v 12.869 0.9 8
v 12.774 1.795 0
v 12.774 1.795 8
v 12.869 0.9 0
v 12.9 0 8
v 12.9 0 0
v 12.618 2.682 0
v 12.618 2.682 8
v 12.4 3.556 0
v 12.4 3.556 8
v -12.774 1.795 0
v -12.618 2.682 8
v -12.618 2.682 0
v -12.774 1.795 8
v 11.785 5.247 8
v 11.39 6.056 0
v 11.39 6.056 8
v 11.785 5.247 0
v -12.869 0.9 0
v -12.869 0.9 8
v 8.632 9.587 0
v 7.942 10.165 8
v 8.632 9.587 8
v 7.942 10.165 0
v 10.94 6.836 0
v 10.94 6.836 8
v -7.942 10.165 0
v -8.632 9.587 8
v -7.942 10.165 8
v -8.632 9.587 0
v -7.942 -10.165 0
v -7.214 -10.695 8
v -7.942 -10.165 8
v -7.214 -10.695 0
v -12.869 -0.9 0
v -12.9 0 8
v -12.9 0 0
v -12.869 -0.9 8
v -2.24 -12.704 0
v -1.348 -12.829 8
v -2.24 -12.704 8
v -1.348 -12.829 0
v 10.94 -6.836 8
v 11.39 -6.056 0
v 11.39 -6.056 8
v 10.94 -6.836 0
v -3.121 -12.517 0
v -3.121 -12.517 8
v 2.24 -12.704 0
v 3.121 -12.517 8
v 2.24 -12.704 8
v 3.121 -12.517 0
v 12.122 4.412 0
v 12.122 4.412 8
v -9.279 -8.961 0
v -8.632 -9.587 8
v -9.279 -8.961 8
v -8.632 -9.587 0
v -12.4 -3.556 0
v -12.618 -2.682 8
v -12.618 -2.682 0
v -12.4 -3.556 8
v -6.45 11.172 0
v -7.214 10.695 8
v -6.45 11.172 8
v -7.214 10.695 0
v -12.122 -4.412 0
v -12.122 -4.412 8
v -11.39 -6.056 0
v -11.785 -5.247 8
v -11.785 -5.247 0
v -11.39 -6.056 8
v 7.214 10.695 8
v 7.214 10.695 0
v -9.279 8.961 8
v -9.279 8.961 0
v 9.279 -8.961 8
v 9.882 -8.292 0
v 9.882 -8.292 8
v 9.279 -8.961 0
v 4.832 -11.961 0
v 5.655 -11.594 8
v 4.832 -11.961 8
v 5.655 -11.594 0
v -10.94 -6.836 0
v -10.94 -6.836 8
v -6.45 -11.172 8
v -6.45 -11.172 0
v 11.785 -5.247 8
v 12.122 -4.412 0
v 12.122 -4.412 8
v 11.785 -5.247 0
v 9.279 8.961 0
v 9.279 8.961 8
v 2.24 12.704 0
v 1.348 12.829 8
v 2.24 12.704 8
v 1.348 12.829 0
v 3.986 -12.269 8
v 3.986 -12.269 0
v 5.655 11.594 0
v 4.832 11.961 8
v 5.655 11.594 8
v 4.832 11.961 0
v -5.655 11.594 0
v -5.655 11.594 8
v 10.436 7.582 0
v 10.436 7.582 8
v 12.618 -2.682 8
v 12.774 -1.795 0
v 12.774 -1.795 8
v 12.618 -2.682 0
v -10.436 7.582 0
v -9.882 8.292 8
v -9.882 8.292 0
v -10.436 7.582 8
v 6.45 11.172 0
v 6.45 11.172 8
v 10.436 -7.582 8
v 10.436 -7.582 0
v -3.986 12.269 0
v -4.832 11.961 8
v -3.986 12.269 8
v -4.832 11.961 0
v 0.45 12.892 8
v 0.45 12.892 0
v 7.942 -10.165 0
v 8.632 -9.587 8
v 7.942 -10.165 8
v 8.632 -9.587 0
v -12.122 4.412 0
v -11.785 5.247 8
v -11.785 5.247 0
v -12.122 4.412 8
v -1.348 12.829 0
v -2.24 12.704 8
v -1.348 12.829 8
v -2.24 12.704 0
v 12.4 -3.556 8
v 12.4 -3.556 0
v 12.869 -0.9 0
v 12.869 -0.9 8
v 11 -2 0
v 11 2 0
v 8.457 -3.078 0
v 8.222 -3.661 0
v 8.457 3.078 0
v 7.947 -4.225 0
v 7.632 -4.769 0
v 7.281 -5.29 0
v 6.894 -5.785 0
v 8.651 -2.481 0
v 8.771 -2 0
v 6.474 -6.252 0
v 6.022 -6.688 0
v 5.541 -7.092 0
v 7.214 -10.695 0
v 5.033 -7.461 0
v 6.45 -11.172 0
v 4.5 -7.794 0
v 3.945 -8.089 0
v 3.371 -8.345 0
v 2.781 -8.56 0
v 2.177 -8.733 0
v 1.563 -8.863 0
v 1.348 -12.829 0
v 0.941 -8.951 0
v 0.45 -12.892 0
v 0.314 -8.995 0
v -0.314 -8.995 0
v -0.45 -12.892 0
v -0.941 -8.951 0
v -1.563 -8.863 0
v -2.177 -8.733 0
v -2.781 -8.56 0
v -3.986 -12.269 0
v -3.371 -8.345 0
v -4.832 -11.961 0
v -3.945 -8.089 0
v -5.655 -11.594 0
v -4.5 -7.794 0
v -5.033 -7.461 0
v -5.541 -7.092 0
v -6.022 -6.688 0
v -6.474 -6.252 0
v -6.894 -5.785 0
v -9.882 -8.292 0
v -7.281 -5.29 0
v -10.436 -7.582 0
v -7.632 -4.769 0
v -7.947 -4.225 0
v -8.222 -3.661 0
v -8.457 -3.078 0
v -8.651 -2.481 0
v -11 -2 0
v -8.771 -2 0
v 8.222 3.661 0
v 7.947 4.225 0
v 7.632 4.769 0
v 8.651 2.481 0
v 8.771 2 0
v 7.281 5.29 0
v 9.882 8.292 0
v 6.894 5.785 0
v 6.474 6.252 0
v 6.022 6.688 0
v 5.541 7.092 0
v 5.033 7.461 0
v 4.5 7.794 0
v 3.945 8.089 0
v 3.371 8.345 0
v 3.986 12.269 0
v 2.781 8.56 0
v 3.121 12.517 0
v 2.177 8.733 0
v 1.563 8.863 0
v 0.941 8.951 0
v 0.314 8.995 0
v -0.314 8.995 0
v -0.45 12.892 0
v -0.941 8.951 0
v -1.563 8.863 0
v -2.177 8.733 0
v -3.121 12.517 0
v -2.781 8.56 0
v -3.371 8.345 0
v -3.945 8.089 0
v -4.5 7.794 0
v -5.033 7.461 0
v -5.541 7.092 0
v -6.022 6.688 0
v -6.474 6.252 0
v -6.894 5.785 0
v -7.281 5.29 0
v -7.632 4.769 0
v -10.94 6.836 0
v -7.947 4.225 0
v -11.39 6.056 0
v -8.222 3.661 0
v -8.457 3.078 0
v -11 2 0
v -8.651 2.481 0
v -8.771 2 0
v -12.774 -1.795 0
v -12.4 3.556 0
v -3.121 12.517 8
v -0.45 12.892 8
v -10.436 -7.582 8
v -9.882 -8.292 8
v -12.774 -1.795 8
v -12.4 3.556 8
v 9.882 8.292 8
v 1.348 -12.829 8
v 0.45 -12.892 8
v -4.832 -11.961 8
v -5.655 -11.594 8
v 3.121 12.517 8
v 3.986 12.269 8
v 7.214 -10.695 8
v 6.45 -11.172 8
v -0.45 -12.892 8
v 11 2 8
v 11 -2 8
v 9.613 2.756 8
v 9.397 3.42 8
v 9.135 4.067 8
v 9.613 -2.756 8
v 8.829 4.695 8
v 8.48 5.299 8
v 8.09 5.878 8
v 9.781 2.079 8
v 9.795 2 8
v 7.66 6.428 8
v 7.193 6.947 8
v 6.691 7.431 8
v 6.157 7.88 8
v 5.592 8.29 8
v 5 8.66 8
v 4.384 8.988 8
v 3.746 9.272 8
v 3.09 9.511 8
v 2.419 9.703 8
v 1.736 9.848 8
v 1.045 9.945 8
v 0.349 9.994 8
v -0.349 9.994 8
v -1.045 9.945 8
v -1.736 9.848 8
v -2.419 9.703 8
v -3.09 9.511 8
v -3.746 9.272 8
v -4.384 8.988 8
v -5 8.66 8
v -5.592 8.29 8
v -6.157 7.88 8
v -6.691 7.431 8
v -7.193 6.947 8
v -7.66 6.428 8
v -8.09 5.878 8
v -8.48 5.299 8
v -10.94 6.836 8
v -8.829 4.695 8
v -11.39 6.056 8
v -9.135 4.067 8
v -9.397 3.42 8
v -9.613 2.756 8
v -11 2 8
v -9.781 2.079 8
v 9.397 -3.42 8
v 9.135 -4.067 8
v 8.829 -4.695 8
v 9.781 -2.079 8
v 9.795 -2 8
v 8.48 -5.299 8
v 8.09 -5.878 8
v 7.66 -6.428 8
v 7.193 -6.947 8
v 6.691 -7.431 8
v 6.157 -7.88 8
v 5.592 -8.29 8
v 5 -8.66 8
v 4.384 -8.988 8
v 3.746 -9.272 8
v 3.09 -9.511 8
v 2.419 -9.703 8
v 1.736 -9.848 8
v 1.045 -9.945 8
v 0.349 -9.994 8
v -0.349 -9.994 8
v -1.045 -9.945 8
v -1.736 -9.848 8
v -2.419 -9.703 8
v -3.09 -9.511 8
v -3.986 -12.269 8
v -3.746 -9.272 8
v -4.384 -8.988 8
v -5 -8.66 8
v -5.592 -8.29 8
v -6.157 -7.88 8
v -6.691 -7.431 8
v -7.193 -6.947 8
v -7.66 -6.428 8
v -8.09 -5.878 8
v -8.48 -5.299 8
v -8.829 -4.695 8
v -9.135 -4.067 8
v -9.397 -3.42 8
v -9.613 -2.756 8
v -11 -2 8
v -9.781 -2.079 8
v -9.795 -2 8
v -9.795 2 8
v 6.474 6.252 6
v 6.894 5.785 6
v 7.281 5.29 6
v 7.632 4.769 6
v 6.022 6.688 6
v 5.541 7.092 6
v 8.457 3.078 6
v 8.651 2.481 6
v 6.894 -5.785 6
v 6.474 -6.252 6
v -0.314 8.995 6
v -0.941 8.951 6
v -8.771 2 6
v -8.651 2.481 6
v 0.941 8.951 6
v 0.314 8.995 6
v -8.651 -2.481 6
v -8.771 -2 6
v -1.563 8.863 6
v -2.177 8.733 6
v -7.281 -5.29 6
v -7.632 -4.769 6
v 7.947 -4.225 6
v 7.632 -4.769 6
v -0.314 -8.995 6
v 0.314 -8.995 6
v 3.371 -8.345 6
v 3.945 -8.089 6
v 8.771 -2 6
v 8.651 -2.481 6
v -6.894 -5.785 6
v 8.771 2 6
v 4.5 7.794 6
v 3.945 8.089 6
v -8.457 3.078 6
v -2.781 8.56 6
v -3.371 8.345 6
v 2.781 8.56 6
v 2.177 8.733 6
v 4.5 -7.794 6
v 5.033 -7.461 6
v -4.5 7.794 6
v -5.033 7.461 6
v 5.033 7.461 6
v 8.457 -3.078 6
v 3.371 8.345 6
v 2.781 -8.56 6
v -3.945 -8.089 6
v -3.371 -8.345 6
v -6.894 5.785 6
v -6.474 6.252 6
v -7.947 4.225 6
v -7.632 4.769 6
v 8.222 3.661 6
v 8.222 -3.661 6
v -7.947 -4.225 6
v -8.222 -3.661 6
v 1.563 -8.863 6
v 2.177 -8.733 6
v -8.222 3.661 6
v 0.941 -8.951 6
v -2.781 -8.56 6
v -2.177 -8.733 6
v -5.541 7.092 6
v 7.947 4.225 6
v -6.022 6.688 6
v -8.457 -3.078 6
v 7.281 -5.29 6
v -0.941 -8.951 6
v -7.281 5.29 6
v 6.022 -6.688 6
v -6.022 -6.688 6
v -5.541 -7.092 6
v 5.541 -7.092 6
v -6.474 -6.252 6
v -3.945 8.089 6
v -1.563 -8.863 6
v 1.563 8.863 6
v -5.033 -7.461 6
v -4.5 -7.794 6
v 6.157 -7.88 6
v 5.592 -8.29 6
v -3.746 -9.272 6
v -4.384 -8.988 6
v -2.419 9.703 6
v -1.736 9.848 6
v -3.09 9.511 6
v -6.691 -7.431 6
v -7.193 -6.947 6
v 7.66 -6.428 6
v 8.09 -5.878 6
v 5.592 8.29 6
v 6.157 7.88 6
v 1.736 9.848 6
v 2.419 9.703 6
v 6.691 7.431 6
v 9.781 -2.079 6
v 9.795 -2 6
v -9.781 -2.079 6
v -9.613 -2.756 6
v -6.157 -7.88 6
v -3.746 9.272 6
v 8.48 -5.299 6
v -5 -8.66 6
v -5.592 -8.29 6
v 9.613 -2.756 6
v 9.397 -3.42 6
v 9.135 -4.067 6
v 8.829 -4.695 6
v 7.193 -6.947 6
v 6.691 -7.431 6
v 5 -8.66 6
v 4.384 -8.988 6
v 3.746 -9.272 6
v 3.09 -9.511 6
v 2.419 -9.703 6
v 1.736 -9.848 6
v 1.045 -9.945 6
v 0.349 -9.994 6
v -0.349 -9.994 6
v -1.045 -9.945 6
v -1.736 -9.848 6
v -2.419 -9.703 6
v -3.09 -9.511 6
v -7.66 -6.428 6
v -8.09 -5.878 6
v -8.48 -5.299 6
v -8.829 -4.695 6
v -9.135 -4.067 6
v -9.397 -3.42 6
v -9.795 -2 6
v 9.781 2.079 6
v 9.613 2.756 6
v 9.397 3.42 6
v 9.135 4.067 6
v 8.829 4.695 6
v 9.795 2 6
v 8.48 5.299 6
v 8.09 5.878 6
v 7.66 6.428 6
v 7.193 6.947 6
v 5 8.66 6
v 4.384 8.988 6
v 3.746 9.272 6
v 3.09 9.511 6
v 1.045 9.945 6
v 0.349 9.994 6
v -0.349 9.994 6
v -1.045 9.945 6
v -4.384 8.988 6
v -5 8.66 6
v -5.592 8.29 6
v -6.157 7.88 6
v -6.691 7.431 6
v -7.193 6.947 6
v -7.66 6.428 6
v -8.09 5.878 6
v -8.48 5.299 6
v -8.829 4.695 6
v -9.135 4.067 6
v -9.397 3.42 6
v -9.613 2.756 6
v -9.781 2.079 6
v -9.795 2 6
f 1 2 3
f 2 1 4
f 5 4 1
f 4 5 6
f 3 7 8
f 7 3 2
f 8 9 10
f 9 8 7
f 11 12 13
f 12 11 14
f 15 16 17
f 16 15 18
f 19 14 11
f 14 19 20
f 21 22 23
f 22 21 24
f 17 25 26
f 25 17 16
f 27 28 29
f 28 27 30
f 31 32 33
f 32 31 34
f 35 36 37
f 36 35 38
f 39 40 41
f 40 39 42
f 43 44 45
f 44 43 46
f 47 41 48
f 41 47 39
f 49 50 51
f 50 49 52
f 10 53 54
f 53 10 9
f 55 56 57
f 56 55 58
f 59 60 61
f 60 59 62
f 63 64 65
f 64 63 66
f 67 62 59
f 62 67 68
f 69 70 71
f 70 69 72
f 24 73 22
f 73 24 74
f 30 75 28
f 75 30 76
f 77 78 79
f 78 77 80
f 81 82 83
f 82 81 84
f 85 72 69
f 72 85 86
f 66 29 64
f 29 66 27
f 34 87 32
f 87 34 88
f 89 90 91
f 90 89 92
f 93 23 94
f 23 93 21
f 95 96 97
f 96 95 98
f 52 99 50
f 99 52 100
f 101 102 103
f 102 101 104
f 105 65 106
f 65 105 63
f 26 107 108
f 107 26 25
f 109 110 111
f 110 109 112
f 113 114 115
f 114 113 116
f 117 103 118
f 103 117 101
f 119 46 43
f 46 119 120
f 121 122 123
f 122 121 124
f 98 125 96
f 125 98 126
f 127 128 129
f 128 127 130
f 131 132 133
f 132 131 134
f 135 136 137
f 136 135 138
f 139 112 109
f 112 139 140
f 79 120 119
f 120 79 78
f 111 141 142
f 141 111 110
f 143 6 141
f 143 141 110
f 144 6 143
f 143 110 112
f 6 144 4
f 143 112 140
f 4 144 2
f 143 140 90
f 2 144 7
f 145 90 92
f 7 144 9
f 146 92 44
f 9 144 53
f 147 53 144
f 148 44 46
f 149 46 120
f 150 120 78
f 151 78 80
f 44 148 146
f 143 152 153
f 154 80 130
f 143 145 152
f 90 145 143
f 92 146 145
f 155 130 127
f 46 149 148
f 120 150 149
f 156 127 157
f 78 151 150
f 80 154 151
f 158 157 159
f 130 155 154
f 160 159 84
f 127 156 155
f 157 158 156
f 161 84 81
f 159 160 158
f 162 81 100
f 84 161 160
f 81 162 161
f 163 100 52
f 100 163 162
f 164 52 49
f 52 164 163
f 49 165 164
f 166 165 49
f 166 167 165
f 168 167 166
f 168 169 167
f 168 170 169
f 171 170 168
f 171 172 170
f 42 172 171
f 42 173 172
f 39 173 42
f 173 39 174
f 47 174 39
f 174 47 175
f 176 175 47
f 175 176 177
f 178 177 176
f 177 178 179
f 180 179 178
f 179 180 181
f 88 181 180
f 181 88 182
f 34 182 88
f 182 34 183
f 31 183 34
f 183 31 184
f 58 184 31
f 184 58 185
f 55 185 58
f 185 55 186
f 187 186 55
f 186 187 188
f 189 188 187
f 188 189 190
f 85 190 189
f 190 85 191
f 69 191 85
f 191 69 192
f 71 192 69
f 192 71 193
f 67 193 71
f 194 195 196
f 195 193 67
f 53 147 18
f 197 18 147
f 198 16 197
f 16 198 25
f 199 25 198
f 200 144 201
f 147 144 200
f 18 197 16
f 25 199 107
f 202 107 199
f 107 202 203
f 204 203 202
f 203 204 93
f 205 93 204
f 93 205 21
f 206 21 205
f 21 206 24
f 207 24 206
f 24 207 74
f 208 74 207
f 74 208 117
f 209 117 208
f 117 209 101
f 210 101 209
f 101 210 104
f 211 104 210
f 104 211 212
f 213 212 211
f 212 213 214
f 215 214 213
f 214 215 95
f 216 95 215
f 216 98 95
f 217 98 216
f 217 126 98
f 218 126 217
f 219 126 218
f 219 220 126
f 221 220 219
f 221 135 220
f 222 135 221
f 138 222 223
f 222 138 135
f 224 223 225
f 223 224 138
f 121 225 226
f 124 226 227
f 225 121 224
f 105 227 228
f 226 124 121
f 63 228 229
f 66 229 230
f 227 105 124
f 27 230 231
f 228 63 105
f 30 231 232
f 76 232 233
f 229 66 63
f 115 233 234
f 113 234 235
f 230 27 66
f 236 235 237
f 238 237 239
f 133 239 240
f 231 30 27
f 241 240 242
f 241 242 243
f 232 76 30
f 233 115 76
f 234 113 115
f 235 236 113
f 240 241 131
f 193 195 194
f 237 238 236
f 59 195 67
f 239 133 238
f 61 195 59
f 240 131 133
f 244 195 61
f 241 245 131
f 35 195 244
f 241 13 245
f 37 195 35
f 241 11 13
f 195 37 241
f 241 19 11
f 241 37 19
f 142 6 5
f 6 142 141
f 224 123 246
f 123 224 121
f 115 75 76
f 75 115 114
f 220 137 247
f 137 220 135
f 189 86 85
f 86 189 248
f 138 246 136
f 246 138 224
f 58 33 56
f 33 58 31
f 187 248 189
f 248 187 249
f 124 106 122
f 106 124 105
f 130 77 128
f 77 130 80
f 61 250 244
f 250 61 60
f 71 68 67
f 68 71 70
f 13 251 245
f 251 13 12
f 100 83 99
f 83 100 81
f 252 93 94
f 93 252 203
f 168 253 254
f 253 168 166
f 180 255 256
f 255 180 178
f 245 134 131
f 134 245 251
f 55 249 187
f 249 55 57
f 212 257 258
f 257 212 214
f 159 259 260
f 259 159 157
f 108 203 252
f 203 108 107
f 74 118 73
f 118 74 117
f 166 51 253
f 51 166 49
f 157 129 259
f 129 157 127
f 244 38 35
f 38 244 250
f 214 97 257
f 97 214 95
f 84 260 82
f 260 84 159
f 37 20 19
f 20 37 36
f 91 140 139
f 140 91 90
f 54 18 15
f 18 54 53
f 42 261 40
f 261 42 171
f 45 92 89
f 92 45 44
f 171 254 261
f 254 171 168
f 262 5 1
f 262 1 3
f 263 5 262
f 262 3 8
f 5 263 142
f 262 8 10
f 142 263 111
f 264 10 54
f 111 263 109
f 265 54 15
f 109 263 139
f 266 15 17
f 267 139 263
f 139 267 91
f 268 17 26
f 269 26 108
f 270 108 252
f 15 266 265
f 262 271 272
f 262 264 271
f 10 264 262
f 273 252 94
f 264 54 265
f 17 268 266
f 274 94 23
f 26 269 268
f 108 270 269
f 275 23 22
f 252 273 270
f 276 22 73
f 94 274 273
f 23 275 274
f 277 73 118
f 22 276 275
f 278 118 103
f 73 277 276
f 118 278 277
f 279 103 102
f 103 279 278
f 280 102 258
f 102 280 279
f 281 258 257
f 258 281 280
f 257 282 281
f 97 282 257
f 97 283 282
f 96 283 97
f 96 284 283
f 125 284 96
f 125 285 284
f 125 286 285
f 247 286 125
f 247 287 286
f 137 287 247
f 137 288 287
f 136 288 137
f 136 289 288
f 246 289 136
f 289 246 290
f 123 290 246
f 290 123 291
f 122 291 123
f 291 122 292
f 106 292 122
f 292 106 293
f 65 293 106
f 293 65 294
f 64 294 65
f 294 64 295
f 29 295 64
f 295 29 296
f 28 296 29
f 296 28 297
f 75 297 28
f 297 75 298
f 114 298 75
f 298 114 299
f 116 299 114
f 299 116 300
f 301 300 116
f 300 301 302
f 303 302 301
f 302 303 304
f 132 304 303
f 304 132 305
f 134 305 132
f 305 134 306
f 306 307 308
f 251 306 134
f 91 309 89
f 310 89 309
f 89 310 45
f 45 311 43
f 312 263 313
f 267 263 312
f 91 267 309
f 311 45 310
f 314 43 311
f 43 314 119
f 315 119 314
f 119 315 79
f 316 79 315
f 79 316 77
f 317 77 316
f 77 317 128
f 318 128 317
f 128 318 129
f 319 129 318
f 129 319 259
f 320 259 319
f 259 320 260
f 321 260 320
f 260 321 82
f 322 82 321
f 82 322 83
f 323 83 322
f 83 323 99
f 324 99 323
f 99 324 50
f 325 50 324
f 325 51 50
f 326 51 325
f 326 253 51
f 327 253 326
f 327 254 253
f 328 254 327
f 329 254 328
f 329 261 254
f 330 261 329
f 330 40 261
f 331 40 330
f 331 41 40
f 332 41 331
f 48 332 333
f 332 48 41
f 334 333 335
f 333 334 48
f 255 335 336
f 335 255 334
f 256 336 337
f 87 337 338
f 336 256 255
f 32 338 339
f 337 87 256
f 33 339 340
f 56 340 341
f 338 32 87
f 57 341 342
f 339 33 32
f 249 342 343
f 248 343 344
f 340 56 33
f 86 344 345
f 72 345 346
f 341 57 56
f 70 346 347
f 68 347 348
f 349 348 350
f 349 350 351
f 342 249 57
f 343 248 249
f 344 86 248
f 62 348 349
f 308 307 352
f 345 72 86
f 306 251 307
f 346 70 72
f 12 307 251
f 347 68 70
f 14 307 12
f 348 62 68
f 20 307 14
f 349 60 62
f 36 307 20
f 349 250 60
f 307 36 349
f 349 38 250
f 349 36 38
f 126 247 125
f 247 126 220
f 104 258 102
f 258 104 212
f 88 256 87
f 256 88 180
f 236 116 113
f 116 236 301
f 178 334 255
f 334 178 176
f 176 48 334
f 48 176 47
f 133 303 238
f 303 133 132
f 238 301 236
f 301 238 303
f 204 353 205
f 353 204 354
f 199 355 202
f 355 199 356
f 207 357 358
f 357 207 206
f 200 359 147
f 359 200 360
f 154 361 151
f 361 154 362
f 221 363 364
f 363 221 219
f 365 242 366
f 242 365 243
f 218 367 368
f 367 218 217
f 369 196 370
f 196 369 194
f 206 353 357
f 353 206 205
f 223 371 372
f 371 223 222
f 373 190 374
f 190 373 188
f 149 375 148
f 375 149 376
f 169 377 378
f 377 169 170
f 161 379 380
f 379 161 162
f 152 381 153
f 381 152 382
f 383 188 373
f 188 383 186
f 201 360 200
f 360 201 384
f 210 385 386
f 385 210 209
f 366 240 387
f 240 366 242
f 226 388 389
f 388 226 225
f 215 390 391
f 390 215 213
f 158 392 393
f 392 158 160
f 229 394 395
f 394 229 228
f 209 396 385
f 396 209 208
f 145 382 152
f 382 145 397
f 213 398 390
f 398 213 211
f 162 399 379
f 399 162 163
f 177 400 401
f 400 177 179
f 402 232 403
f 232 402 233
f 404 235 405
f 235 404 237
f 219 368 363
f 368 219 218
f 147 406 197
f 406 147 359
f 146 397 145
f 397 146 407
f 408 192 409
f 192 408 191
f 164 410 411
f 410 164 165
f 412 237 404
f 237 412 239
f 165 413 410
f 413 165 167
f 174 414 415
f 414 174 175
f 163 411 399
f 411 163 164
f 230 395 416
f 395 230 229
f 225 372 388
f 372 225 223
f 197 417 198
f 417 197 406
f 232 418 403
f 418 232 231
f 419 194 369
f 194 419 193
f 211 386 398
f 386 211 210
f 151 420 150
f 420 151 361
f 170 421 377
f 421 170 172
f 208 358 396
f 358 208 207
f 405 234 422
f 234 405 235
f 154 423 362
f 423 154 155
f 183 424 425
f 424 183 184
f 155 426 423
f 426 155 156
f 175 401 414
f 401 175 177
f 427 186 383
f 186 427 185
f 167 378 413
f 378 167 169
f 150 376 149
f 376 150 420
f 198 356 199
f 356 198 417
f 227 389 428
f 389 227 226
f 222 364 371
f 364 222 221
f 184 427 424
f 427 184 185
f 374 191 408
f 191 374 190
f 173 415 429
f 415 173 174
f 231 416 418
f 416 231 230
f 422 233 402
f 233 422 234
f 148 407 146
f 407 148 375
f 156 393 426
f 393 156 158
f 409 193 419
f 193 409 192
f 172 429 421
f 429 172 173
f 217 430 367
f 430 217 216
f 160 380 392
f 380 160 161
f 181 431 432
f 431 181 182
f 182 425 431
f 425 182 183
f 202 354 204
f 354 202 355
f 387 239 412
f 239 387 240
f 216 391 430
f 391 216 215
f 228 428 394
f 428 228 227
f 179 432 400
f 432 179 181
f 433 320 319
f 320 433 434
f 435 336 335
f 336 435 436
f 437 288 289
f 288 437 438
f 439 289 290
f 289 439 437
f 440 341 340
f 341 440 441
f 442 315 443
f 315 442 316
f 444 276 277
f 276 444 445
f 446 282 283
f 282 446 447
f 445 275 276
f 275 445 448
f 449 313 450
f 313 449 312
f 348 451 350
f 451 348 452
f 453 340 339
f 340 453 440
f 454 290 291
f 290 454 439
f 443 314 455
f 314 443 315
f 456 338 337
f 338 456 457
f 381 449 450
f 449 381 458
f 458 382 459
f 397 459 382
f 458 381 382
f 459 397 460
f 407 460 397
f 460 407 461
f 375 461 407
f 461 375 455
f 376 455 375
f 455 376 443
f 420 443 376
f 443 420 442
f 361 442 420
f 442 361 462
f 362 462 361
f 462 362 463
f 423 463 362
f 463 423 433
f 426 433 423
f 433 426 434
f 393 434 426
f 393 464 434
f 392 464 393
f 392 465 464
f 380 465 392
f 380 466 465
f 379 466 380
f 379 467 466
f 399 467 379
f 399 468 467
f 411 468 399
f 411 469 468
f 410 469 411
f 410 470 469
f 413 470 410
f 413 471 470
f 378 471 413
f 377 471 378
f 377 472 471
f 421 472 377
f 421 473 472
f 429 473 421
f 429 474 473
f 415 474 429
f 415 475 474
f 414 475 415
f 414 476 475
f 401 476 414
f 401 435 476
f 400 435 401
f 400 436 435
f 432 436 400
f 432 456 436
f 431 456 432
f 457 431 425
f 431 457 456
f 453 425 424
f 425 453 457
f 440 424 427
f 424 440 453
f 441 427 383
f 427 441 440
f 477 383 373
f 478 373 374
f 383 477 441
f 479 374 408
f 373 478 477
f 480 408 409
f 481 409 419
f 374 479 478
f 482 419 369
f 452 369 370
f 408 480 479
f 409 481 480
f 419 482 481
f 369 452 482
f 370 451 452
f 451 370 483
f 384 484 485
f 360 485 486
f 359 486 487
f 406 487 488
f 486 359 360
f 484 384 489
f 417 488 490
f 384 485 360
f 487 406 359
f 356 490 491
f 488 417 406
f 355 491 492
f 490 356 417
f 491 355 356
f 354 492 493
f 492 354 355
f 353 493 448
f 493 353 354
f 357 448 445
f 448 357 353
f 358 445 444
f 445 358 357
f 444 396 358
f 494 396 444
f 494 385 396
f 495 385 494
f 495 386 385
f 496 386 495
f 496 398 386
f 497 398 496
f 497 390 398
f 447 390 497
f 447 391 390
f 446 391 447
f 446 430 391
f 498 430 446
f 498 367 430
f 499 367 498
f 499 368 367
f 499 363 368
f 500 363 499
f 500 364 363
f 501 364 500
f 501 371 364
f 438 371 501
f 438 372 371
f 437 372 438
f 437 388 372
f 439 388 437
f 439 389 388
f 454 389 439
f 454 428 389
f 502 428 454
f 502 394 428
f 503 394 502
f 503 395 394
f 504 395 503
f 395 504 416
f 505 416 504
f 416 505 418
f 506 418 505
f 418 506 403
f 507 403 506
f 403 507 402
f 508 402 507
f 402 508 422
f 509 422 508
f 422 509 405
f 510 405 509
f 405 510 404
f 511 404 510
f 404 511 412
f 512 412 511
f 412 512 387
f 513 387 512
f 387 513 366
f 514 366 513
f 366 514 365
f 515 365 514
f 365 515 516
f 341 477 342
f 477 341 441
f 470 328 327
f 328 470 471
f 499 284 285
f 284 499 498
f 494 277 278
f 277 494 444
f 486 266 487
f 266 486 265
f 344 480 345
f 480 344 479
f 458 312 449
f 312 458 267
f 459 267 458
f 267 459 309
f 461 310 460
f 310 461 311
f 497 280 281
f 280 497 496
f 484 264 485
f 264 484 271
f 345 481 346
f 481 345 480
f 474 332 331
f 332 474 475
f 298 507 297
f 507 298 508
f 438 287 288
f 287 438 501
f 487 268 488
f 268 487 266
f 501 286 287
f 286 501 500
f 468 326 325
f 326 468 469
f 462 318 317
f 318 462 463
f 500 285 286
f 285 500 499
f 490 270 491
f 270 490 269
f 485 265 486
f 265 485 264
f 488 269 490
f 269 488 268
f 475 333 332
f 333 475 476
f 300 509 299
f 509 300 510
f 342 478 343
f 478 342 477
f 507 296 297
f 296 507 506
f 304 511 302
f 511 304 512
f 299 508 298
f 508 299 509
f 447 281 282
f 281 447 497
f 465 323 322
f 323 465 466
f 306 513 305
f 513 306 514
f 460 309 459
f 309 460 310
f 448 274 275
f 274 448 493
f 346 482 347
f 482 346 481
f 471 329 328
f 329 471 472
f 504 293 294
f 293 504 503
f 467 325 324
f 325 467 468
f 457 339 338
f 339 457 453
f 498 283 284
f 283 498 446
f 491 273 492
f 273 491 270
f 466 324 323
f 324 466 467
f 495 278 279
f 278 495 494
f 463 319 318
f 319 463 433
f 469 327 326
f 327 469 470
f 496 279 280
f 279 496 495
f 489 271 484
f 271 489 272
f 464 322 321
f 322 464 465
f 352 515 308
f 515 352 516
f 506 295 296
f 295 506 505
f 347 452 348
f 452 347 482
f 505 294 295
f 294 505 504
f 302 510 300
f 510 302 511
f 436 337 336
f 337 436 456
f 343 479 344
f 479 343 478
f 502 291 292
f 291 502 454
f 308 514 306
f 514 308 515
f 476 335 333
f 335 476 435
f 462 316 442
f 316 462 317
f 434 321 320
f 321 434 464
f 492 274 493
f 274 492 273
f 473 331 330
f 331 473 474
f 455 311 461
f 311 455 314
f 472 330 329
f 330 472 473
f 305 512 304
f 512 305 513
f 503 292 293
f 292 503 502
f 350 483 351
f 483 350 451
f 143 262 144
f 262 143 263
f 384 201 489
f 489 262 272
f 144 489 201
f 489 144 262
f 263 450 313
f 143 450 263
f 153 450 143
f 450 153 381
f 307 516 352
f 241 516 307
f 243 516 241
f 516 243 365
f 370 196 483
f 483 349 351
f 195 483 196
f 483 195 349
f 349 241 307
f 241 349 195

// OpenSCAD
// file: dim.scad
FACES 				= 180;
EPSILON 			= 0.1;

INCHES_TO_MM 		= 25.4;
MM_TO_INCHES 		= 1 / INCHES_TO_MM;

// Marks - absolute location.
M_WAY_BACK          = -40;
M_POMMEL            = -37;      // approximate. hard to measure.
M_SPEAKER_BACK      = -36;
M_0                 = 0;        // physical back of the lightsaber main body.
M_AFT_STOP          = 10;
M_DISPLAY           = 14;       // was 15
M_PORT_CENTER       = 58;
M_CRYSTAL_VIEW_CENTER = 93;
M_SWITCH_CENTER     = 147.5;
M_EMITTER_BASE      = 165.5;
M_EMITTER           = M_EMITTER_BASE + 0;

M_MC                = 68;

H_FAR               = 240;

// inner diameter of the lightsaber tube.
// shock is constant, within tolerances
D_INNER      		= 32.258;
R_INNER             = D_INNER / 2;
D_INNER_CORE        = 25;
D_OUTER             = 37.6;
D_AFT               = 25.8;
R_AFT               = D_AFT / 2;
D_AFT_RING          = 33.5;
H_AFT_RING          = 6;
H_AFT_LIP           = 4;
FLOOR_Y             = -12;
Y_FLATTEN           = -15;

M_AFT_STOP_FRONT    = M_AFT_STOP + H_AFT_RING + H_AFT_LIP;

H_SPEAKER = 3.6 + 1.0;  // space for the physical speaker
X_SPEAKER = 20;
Y_SPEAKER = 14.2;   
Y_SPEAKER_INNER = 8.4;  // air channel
H_SPEAKER_HOLDER = H_SPEAKER + 1.2;

// emitter head
D_EMITTER_RING      = 33.4;

// dimensions of the main ring.
H_RING 				= 16;
T_RING 				= 2.5;

// dimensions of pin holders and pins
PIN	   				= 2.54;
H_PIN_HOLDER 		= 8;
T_PIN_HOLDER_WALL 	= 2;

N_TEETH				= 2;
TEETH_ANGLE			= 90;

// Pin counts:
X_EMITTER 			= 4;
Y_EMITTER 			= 1;

H_BUTTRESS			= 3.5;       // internal buttress / baffles
DZ_BUTTRESS         = 4.5;

M_ZONE_0            = M_DISPLAY;
M_ZONE_1            = M_AFT_STOP_FRONT + H_BUTTRESS*5 + DZ_BUTTRESS*6 - 0.001;
M_ZONE_2            = M_AFT_STOP_FRONT + H_BUTTRESS*14 + DZ_BUTTRESS*14 + 0.001;
M_ZONE_3            = M_EMITTER_BASE;

W_CRYSTAL           = 12.1;
H_CRYSTAL           = 10;
Y_CRYSTAL           = 9;        // offset up of the crystal
Z_CRYSTAL           = 52;

DISPLAY_W           = 23 + 0.5;
DISPLAY_L           = 32 + 0.5;
DISPLAY_MOUNT_W     = 17;
DISPLAY_MOUNT_L     = 26;
D_DISPLAY_MOUNT     = 2;
Y_DISPLAY           = 10;
DISPLAY_PINS        = 20;

D_SWITCH			= 12.5;						// actually 12, by thread.
Y_SWITCH            = 13.5;

D_PORT              = 7.9;

W_MC                = 18;
H_MC                = 11;
Z_MC_35             = 71.5;     // includes SD
SHOULDER_DX         = 2.5;
SHOULDER_DZ         = 3.5;

X_ROD               = 10.5;
Y_ROD               =  3.5;
D_ROD               =  3.4;

POWER_DX            = 9.6;
POWER_DY            = 14;
POWER_DZ            = 11;
POWER_Y             = 0.5;

H_BATTERY           = 68;
D_BATTERY           = 18.50 + 0.5;    // An 1850. Huh. 
DY_BATTERY          = -1;

X_DOTSTAR           = 5.0 + 0.5;  // from spec
Y_DOTSTAR           = 1.4;  // from spec
DOTSTAR_STRIP       = 12.4;

DX_USB              = 21.0;
DX_USB_INNER        = 14.0;
DY_USB              = 10.4;
SLOT_USB            = 1.0;

OFFSET_EMITTER = -PIN + sqrt(R_INNER * R_INNER - PIN * PIN * X_EMITTER * X_EMITTER / 4);

module emitterPin(h, longY)
{
	Y = longY ? 40 : PIN;

    translate([-X_EMITTER * PIN / 2, OFFSET_EMITTER, 0]) {
        cube([X_EMITTER * PIN, Y, h]);
    }	
}

module emitterHolder(h)
{
    translate([-X_EMITTER * PIN / 2, OFFSET_EMITTER, 0]) {
    	translate([-T_PIN_HOLDER_WALL, -T_PIN_HOLDER_WALL, 0]) {
      		cube([X_EMITTER * PIN + T_PIN_HOLDER_WALL*2, PIN + T_PIN_HOLDER_WALL*2, h]);
    	}
    }	
	
}

// Uses the same dimensions as the emitter holder so they 
// can be used interchangeably.
module lock(h)
{
    translate([-X_EMITTER * PIN / 2 - T_PIN_HOLDER_WALL, -20, 0]) {
		cube([X_EMITTER * PIN + T_PIN_HOLDER_WALL * 2, 40, h]);
	}	
}
// file: ../shapes.scad
FACES   = 180;
EPSILON = 0.1;
PIN	    = 2.54;


module tube(h=1, inner=0, outer=0, di=0, do=0) {
    rInner = inner > 0 ? inner : di / 2;
    rOuter = outer > 0 ? outer : do / 2;

	if (rInner >= rOuter) echo("ERROR in tube. rOuter must be > rInner.");

	difference() {
		cylinder(h=h, r=rOuter);
		translate([0,0,-EPSILON]) {
			cylinder(h=h + EPSILON*2, r=rInner);
		}
	}
}

module roundedRect(h, d)
{
	D0 = d * 0.8;
	D1 = d * 0.2;
	H = h;

	hull()
	{
		translate([-D0/2, -D0/2, 0]) {
			cube([D0, D0, H]);
		}
		translate([-D0/2, -D0/2, 0])  cylinder(d=D1, h=H);
		translate([ D0/2, -D0/2, 0])  cylinder(d=D1, h=H);
		translate([-D0/2,  D0/2, 0])  cylinder(d=D1, h=H);
		translate([ D0/2,  D0/2, 0])  cylinder(d=D1, h=H);
	}
}

module cubePair(x, size)
{
	translate([x, 0, 0])
		cube(size=size);
	mirror([1,0,0]) translate([x, 0, 0])
		cube(size=size);
}

module polygonXY(h, points)
{
    linear_extrude(height = h) {
        polygon(points=points);
    }  
}

module polygonYZ(h, points)
{
    multmatrix(m = [ [0, 0, 1, 0],
    				 [1, 0, 0, 0],
    				 [0, 1, 0, 0],
    				 [0, 0, 0, 1]
       			   ])
    linear_extrude(height = h) {
        polygon(points=points);
    }  	
}

module polygonXZ(h, points)
{
    multmatrix(m = [ [1, 0, 0, 0],
    				 [0, 0, 1, 0],
    				 [0, 1, 0, 0],
    				 [0, 0, 0, 1]
       			   ])
    linear_extrude(height = h) {
        polygon(points=points);
    }  	
}


module zCapsule(dz0, dz1, r)
{
    hull() {
        translate([0, 0, dz0]) rotate([-90, 0, 0]) cylinder(h=50, r=r);
        translate([0, 0, dz1]) rotate([-90, 0, 0]) cylinder(h=50, r=r);
    }
}


module xRoofCube(size)
{
	x = size[0];
	y = size[1];
	z = size[2];

	polygonXY(h=z, points=[
		[0, 0],
		[x, 0],
		[x, y + x],		// gets the 45 degree angle for printing
		[0, y]
	]);
}
// main file
use <../shapes.scad>
include <dim.scad>

/*
	2 sections:
	SPKR_METAL
	SPKR_PLASTIC
*/

module speaker20() {
    $fn=90;

    SPKR_METAL_H   = 6;
    SPKR_METAL_D   = 18;    
    SPKR_PLASTIC_H = 2;
    SPKR_PLASTIC_D = 20;
    SPKR_H = SPKR_METAL_H + SPKR_PLASTIC_H;
    HOLE_X = 2;
    HOLE_Y = 4;

    difference() 
    {
        difference() {
            cylinder(d=D_AFT, h=SPKR_H);
            cylinder(d=SPKR_METAL_D, h=SPKR_H);
            translate([0, 0, SPKR_METAL_H]) cylinder(d=SPKR_PLASTIC_D, 10);
        }
        ROTATIONS = [0, 180];
        for(r=ROTATIONS) {
            rotate([0, 0, r]) {
                translate([SPKR_METAL_D/2-1, -HOLE_Y/2, 0]) {
                    cube(size=[HOLE_X+1, HOLE_Y, 10]);
                }
            }
        }
    }    
}

speaker20();
